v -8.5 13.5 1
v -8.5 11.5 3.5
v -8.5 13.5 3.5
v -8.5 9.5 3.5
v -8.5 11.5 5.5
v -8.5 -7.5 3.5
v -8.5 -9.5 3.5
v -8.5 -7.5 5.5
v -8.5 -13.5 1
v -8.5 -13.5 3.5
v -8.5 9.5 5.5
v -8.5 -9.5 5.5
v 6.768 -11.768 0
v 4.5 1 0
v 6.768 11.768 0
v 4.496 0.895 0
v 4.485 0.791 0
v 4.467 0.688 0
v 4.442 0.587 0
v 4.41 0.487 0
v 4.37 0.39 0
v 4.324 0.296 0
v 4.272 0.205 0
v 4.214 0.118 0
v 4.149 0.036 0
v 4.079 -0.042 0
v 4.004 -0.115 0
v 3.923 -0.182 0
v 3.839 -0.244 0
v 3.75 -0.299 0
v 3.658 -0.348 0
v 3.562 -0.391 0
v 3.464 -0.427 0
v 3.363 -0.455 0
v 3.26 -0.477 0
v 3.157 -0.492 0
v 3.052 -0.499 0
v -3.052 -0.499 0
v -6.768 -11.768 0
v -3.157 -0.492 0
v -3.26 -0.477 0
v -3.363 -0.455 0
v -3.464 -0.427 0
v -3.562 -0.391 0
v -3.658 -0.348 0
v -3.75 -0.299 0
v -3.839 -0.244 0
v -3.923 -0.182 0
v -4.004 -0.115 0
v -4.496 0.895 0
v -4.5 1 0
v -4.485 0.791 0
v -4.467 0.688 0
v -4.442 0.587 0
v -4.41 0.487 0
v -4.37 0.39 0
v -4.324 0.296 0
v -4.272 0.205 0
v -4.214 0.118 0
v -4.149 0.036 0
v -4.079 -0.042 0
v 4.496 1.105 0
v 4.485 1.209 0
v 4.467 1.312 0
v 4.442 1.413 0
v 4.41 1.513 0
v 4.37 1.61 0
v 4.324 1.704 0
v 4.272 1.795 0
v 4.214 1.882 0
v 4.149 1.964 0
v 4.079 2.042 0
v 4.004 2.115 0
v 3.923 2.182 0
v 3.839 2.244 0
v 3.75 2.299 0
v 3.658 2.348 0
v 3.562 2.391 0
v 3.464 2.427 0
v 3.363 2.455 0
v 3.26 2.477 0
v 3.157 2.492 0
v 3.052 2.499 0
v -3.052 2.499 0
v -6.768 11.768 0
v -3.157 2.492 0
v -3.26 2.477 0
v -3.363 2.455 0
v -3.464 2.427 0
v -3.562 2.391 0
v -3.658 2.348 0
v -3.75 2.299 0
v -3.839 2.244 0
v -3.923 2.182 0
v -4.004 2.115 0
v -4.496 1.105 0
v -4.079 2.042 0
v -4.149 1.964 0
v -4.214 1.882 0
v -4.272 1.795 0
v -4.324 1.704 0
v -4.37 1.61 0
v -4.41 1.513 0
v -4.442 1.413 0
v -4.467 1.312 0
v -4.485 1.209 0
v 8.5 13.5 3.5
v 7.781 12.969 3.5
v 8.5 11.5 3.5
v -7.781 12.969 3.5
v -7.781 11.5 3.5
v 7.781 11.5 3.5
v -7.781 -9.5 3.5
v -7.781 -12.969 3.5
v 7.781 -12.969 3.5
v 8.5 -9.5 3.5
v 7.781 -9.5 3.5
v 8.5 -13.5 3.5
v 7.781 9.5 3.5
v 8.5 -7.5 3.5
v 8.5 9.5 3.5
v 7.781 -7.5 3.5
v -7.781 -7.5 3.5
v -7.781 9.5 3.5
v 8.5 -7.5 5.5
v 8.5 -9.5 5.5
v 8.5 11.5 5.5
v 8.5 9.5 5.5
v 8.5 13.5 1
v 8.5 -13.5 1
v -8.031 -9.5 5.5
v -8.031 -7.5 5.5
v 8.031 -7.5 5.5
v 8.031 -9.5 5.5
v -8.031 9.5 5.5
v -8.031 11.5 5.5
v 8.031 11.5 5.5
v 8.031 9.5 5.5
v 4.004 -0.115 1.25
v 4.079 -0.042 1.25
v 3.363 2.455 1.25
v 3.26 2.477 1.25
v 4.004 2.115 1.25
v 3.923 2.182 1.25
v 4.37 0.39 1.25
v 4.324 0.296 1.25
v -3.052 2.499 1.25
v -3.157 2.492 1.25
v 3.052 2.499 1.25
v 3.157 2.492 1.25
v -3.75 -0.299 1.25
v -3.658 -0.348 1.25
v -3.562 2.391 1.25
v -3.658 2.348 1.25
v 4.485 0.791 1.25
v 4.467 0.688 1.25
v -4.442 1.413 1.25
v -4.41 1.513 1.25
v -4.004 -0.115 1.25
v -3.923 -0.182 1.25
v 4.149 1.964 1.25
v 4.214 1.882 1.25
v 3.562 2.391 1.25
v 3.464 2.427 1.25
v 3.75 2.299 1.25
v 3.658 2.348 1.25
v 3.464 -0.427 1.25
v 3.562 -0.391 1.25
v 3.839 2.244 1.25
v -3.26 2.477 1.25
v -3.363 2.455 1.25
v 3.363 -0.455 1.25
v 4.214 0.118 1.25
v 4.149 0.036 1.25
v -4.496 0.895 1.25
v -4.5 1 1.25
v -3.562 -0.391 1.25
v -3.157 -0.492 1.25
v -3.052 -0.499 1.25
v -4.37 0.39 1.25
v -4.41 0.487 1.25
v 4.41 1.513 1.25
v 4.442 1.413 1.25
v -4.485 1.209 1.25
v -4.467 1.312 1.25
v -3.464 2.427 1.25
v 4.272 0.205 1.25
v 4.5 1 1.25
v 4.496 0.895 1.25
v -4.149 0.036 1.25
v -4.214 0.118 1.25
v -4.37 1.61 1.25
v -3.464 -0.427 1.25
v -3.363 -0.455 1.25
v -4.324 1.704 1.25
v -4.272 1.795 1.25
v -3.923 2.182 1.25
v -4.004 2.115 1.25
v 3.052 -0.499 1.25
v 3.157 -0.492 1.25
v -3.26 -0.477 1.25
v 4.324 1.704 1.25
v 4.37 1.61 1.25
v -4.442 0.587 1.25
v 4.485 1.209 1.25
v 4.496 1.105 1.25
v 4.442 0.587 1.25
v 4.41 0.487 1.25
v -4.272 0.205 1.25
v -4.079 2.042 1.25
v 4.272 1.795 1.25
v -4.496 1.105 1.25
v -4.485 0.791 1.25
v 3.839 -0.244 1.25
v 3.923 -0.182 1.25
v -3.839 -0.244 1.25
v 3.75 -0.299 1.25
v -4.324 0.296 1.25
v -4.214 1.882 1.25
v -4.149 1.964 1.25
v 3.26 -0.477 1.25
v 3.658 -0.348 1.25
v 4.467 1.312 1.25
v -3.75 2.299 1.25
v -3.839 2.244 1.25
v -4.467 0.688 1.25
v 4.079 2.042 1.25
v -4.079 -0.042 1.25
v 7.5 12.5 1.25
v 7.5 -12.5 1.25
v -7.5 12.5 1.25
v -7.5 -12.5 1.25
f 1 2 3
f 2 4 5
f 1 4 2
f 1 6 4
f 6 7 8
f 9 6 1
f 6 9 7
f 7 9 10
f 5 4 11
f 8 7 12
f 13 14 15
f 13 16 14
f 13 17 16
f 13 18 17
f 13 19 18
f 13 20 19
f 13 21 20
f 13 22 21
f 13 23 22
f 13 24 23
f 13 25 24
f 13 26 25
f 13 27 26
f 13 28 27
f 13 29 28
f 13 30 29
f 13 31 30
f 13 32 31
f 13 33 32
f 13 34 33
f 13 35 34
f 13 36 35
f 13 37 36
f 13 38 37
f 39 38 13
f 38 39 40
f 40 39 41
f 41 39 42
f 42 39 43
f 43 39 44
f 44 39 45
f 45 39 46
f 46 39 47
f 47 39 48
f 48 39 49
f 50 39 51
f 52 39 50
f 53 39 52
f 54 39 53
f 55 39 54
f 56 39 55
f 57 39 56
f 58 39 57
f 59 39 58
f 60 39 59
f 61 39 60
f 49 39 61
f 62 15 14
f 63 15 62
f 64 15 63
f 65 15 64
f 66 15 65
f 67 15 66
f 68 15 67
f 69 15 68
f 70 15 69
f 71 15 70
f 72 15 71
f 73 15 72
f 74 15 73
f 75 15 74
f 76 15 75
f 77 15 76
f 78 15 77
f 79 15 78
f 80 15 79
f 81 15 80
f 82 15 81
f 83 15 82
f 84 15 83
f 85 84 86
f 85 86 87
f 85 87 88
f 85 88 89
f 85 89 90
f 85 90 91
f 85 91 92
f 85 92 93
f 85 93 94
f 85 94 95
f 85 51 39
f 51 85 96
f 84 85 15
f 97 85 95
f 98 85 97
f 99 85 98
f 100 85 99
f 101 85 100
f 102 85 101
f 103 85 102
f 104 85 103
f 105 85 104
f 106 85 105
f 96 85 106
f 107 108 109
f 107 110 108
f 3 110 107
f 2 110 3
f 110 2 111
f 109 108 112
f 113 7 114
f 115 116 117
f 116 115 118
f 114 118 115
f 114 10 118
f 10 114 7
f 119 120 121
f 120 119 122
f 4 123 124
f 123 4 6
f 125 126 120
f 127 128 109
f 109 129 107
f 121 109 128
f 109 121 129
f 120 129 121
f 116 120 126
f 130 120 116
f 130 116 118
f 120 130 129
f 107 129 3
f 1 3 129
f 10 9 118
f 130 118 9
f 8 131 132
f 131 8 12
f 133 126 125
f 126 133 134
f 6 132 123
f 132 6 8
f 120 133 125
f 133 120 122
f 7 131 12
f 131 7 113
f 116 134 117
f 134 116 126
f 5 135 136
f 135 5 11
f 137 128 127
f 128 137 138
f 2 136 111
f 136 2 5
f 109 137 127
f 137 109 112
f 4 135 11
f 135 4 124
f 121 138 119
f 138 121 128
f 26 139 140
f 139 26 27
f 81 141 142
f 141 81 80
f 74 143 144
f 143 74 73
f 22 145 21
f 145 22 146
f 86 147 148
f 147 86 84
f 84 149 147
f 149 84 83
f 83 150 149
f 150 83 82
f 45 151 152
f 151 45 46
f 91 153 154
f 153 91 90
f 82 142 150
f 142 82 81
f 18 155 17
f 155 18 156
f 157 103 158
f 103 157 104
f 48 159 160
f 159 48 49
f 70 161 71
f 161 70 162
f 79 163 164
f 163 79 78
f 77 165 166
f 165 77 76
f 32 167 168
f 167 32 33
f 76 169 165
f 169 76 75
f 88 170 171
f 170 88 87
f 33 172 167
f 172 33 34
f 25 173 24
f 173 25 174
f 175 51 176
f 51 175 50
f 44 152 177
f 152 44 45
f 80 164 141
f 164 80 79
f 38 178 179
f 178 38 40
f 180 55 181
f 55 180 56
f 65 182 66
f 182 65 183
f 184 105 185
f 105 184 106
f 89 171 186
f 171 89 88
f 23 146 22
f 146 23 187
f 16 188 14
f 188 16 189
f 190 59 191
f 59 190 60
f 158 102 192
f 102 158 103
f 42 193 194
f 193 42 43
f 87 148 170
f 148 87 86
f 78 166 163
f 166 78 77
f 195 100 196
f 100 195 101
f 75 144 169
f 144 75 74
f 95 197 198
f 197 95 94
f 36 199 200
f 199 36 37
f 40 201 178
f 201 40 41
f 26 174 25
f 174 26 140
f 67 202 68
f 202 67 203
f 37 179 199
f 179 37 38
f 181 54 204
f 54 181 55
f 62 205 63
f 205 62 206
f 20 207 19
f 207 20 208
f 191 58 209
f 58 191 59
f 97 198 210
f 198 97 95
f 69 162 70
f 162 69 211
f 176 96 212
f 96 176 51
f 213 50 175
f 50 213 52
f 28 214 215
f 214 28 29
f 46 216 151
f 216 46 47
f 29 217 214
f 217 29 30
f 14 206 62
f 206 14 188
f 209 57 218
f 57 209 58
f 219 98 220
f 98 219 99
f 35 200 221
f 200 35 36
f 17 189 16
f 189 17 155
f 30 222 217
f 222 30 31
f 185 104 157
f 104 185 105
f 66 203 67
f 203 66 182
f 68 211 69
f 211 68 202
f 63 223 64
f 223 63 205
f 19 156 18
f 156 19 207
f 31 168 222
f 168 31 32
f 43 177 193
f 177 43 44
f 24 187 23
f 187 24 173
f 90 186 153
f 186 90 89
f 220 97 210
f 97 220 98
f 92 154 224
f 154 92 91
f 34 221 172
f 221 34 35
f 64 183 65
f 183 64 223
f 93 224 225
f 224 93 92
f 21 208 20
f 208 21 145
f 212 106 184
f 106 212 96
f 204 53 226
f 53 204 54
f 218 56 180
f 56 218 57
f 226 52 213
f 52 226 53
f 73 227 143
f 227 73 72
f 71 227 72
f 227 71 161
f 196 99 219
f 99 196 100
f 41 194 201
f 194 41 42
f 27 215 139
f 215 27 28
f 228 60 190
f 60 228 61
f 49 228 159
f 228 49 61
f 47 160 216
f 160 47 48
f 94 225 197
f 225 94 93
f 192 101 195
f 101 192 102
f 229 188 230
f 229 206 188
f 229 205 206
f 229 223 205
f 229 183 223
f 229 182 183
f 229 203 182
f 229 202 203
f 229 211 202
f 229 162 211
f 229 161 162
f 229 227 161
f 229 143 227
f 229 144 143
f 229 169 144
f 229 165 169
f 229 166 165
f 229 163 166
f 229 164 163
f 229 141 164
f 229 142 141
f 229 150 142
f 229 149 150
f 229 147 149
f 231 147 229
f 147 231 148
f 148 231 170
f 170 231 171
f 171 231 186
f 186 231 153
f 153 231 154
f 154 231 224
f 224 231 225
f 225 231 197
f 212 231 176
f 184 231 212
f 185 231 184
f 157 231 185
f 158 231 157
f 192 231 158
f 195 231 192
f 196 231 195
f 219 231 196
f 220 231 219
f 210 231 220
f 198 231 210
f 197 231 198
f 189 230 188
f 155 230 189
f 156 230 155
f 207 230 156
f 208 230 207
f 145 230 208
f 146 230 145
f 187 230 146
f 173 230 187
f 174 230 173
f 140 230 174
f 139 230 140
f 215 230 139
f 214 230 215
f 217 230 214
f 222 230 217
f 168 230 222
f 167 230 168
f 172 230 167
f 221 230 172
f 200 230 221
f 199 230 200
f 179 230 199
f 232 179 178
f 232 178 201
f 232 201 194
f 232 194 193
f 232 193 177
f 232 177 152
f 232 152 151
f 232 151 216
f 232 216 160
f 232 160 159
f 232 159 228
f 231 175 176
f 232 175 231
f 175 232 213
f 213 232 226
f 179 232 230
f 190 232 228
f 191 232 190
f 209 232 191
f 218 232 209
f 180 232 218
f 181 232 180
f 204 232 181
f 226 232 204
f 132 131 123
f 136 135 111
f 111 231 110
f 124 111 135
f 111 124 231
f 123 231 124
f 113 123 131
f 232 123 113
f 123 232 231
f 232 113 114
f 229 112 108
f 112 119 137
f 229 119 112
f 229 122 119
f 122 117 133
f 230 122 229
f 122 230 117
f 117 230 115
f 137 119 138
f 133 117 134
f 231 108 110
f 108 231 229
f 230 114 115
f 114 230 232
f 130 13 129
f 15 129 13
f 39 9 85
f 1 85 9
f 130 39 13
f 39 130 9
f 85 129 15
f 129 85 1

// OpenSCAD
/*
  Elna Zig Zag darning plate
  A small metal formed plate that covers the transport dogs,
  used in combination with the darning foot.
  This enables the user to move the fabric freely under the needle,
  putting down stitches all over the place.

  These things are unobtainium, or via etsy for around $95
  
  This is a 3d printed replacement, prints in 10 minutes and costs
  a few cents. Knock off the corners with a file or sandpaper
*/


$fn=90;

// how much the inside of the plate sticks out above the needle plate.
// there's not much room needed, just to give the transport dogs some
// room to move unobstructed.
//
// too low (<2.4mm) and the transport dogs will lift the plate up.
// it needs some height so the darning foot can apply pressure on the
// fabric and hold it in place
h=3.5;

// needle plate dimensions
plate_w=15;
plate_d=25;

// stub length 
// they register in the needle plate of the machine. Not too short,
// not too long
stub=2.0;

thickness=1;

w=plate_w+thickness*2;
d=plate_d+thickness*2;

// make the part (and place it upside down for printing)
translate([0,0,h/2]) rotate([0,180,0]) difference() {
  // form the outside first, remove what's not needed later
  union() {
    cube([w,d,h],center=true);

    // these form the features that register in the
    // notches in the needleplate on the machine
    translate([0,-(plate_d/2-4),-stub/2])
      cube([w,2,stub+h], center=true);
    translate([0, (plate_d/2-2),-stub/2])
      cube([w,2,stub+h], center=true);
  }

  // slot for the needle. Elongated to make zigzag possible
  translate([0,(plate_d/2-11.5),0])
    hull() {
      translate([3,0,0])
        cylinder(h=30,d=3,center=true);
      translate([-3,0,0])
        cylinder(h=30,d=3,center=true);
    }

  // hollow out the underside. A bit slanted to make it somewhat
  // sturdier. I hope
  carve_h=h*2+stub;
  translate([0,0,-(carve_h-thickness)/2])
    rotate([0,180,0])
      linear_extrude(height=carve_h, center=true, scale=1.15)
        square([plate_w,plate_d], center=true);

    // Make some chamfers, because we're not animals
    chamfer=1.0;
    angle=30;

    oversize=2;
    h1=h*oversize;
    d1=d*oversize;
    w1=w*oversize;

    // calculate offset
    f=((h1/oversize)/sin(angle))+((h/2-chamfer)/tan(angle));

    translate([-(w/2+f),0,0])
      rotate([0,-angle,0])
        cube([w1,d1,h1], center=true);

    translate([(w/2+f),0,0])
      rotate([0,angle,0])
        cube([w1,d1,h1], center=true);

    translate([0,-(d/2+f),0])
      rotate([angle,0,0])
        cube([w1,d1,h1], center=true);

    translate([0,(d/2+f),0])
      rotate([-angle,0,0])
        cube([w1,d1,h1], center=true);

};
